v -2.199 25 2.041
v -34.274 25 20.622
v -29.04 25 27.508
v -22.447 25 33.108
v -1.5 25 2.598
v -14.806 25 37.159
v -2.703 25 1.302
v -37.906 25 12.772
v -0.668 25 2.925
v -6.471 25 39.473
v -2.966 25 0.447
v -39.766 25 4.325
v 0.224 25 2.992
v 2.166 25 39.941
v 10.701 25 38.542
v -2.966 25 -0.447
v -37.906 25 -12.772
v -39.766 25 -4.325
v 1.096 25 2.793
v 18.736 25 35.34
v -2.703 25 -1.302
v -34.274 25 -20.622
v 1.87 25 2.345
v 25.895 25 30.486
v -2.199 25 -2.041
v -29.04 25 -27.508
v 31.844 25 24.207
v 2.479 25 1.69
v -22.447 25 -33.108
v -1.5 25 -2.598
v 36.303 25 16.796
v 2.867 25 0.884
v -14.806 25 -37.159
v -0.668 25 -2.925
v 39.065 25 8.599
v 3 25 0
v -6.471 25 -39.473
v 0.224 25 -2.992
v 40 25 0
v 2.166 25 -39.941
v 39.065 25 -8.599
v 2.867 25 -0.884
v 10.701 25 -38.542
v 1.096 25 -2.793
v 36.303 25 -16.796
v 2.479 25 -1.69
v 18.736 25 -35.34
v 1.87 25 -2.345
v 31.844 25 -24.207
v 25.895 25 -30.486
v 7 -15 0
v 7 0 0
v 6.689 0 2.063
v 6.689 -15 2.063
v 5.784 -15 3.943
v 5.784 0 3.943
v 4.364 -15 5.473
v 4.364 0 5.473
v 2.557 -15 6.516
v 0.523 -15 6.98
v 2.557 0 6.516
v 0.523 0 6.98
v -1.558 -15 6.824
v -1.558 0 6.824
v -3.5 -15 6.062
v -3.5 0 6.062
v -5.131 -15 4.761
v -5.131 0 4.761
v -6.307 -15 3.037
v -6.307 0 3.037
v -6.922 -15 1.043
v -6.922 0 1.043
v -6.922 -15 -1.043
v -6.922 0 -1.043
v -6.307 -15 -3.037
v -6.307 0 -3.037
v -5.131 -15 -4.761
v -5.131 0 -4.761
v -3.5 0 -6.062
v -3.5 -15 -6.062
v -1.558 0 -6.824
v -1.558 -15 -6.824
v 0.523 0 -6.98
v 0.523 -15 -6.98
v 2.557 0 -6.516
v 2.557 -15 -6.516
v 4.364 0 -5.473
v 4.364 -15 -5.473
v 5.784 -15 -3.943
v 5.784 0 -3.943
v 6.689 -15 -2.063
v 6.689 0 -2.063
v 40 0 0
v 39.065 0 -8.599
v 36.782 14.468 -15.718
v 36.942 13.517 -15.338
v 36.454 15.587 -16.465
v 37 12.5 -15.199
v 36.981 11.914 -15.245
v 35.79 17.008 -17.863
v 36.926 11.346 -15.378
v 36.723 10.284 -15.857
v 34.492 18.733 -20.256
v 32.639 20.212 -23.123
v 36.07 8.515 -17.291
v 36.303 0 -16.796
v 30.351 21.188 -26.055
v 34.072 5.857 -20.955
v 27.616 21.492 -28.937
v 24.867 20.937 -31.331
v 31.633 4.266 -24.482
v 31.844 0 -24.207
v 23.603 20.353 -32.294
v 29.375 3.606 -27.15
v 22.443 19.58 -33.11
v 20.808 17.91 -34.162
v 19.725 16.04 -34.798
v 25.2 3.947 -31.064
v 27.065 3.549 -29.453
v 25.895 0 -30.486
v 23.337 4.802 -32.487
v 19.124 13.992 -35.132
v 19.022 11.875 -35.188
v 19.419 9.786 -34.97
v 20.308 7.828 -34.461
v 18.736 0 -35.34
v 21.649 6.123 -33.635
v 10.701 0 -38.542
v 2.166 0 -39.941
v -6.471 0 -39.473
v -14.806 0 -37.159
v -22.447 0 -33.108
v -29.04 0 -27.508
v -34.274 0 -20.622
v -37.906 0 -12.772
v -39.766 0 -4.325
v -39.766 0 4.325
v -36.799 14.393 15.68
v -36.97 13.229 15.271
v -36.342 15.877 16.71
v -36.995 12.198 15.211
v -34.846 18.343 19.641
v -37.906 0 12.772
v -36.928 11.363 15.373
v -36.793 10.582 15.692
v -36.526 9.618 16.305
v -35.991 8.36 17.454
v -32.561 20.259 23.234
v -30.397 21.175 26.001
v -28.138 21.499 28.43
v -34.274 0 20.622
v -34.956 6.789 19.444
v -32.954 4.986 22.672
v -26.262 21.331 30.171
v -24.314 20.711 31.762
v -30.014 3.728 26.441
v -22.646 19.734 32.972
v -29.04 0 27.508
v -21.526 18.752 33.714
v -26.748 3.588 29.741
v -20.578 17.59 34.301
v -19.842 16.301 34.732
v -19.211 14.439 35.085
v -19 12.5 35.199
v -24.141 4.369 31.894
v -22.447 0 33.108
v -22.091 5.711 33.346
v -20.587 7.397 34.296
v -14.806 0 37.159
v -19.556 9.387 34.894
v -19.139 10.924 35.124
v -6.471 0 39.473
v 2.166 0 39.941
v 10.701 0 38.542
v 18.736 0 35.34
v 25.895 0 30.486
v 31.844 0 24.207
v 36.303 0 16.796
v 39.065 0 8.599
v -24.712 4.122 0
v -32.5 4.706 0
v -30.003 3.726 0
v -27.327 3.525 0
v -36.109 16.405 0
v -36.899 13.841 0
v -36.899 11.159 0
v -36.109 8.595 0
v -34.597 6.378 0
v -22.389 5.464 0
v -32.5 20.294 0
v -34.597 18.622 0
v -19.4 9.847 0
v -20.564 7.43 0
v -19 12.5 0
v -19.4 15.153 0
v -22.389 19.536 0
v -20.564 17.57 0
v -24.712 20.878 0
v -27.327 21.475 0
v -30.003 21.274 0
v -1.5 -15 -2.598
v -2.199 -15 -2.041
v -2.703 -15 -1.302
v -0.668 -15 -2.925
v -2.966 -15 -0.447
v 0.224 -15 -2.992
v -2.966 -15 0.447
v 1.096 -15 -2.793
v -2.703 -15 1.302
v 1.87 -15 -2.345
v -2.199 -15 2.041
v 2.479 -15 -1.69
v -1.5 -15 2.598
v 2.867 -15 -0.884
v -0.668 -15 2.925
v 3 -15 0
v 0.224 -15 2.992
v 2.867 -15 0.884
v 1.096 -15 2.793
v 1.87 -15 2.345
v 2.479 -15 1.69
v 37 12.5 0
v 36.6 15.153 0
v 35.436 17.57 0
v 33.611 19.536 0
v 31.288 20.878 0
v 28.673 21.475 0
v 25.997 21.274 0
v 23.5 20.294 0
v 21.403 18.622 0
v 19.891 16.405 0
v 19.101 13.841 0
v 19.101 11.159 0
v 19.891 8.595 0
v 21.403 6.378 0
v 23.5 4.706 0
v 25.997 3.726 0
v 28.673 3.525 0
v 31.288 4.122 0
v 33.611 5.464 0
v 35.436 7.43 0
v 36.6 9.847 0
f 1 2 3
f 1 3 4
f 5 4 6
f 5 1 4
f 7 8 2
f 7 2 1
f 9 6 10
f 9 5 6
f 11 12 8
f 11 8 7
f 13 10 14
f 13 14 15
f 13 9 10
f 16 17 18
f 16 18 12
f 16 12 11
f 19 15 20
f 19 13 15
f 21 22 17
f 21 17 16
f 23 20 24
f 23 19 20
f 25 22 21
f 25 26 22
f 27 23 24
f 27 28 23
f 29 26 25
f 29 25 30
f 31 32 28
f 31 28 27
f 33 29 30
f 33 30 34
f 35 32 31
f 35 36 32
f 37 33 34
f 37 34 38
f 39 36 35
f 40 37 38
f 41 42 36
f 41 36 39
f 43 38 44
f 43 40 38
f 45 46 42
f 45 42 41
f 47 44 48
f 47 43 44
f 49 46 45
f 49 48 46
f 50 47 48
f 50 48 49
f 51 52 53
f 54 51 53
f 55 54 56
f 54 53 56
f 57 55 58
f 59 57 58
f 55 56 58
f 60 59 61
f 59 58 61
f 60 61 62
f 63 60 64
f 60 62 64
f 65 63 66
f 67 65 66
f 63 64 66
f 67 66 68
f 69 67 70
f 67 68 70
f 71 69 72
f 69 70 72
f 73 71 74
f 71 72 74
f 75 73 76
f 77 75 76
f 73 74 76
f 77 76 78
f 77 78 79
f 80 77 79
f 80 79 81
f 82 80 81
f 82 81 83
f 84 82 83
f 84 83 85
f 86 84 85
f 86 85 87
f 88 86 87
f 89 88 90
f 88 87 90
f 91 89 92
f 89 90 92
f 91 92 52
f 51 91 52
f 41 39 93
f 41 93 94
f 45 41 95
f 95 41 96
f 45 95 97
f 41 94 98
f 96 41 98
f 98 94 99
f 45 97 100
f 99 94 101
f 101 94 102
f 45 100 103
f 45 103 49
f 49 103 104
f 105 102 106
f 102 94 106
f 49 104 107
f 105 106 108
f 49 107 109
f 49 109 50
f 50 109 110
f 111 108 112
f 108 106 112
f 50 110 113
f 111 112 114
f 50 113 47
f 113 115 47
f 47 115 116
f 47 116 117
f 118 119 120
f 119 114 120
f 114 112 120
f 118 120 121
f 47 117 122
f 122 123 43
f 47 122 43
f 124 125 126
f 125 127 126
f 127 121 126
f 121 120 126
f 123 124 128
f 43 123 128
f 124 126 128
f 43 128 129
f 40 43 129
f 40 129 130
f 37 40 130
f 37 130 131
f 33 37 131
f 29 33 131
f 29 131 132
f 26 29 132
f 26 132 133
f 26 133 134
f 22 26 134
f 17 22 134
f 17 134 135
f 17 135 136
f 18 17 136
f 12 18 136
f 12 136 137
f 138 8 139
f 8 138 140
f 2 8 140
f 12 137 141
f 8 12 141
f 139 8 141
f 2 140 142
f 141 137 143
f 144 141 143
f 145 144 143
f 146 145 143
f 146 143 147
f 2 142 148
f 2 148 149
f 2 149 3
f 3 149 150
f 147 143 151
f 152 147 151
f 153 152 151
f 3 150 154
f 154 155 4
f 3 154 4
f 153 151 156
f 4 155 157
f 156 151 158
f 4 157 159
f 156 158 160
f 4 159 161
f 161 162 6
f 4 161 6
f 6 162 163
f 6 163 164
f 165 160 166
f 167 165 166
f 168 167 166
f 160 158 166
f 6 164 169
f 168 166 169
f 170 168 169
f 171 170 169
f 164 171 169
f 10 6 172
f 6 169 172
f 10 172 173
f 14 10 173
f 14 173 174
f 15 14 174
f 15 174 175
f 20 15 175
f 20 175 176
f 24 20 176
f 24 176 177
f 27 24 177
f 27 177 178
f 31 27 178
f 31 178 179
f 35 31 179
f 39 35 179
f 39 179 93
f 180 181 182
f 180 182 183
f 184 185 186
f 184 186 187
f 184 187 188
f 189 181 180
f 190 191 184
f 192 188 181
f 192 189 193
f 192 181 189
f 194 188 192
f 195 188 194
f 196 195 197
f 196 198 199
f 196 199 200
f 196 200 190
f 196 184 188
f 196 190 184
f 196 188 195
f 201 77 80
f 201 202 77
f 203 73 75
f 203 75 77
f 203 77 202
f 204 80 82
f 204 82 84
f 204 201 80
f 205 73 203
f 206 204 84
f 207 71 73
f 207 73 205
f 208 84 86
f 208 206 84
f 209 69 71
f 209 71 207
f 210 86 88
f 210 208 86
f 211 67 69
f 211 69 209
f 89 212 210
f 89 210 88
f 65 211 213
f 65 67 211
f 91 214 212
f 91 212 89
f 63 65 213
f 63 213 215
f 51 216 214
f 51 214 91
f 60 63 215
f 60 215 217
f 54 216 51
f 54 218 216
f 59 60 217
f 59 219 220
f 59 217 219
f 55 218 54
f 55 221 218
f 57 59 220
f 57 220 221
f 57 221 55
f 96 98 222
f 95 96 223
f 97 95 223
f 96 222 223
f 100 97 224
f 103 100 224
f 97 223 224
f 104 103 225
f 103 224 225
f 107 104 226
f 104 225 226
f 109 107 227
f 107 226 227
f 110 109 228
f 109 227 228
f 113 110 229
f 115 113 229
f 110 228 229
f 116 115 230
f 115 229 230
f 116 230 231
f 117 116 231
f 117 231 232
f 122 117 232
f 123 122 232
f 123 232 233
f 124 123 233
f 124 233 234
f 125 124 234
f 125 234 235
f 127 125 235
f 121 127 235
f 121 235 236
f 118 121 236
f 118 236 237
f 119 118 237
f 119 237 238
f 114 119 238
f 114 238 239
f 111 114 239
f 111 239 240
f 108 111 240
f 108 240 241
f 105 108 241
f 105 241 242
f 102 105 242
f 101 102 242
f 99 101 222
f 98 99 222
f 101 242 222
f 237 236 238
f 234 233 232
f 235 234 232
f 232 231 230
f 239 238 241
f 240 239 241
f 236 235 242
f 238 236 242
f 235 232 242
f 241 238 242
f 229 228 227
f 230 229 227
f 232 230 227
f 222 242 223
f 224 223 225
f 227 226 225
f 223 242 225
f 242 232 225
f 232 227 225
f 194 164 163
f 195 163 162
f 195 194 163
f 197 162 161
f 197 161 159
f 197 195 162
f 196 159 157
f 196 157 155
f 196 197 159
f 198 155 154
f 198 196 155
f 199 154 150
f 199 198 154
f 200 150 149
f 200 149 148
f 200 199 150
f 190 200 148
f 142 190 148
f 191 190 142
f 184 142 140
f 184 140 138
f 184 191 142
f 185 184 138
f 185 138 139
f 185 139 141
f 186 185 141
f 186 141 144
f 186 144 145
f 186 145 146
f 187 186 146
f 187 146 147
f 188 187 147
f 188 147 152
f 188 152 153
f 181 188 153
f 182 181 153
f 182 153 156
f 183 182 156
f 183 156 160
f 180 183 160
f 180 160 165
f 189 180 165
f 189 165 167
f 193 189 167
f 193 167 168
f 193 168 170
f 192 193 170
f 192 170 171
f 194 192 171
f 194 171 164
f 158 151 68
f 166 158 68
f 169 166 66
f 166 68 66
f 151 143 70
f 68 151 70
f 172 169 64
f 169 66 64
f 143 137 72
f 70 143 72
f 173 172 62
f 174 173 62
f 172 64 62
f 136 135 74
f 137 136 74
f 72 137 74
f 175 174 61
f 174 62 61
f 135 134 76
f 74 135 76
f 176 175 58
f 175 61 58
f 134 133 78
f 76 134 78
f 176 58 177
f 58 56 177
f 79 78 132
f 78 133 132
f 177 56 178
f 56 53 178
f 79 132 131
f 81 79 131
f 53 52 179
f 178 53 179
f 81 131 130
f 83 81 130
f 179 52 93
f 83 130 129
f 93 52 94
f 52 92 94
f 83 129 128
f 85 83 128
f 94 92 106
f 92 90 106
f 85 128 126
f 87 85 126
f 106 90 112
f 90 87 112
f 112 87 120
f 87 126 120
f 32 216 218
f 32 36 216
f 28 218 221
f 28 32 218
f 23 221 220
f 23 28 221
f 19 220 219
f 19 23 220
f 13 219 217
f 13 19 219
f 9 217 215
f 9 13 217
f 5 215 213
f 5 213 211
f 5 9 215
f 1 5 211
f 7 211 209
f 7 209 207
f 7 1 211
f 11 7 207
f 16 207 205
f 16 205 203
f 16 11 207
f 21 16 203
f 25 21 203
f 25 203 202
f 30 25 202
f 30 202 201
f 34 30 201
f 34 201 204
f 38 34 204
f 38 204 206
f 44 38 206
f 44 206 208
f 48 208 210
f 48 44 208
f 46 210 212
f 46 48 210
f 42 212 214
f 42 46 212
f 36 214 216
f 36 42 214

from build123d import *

# Parameters (mm, degrees)
SKETCH1_R           = 40
SKETCH1_R_2         = 3
BOSS_EXTRUDE1_DEPTH = 25
SKETCH2_R           = 7
SKETCH2_R_2         = 3
BOSS_EXTRUDE2_DEPTH = 15
SKETCH3_R           = 9
CUT_EXTRUDE1_DEPTH  = 41
SKETCH4_R           = 9
CUT_EXTRUDE2_DEPTH  = 41.0000001


with BuildPart() as part:
    # Sketch1 → Boss-Extrude1 (new body)
    with BuildSketch(Plane(origin=(0, 0, 0), x_dir=(1, 0, 0), z_dir=(0, 1, 0))):
        Circle(SKETCH1_R)
        Circle(SKETCH1_R_2, mode=Mode.SUBTRACT)
    extrude(amount=BOSS_EXTRUDE1_DEPTH)

    # Sketch2 → Boss-Extrude2 (add)
    with BuildSketch(Plane.XZ):
        Circle(SKETCH2_R)
        Circle(SKETCH2_R_2, mode=Mode.SUBTRACT)
    extrude(amount=BOSS_EXTRUDE2_DEPTH)

    # Sketch3 → Cut-Extrude1 (cut, through all)
    with BuildSketch(Plane.XY):
        with Locations((28, 12.5)):
            Circle(SKETCH3_R)
    extrude(amount=-CUT_EXTRUDE1_DEPTH, mode=Mode.SUBTRACT)

    # Sketch4 → Cut-Extrude2 (cut, through all)
    with BuildSketch(Plane.XY):
        with Locations((-28, 12.5)):
            Circle(SKETCH4_R)
    extrude(amount=CUT_EXTRUDE2_DEPTH, mode=Mode.SUBTRACT)


solid = part.part
